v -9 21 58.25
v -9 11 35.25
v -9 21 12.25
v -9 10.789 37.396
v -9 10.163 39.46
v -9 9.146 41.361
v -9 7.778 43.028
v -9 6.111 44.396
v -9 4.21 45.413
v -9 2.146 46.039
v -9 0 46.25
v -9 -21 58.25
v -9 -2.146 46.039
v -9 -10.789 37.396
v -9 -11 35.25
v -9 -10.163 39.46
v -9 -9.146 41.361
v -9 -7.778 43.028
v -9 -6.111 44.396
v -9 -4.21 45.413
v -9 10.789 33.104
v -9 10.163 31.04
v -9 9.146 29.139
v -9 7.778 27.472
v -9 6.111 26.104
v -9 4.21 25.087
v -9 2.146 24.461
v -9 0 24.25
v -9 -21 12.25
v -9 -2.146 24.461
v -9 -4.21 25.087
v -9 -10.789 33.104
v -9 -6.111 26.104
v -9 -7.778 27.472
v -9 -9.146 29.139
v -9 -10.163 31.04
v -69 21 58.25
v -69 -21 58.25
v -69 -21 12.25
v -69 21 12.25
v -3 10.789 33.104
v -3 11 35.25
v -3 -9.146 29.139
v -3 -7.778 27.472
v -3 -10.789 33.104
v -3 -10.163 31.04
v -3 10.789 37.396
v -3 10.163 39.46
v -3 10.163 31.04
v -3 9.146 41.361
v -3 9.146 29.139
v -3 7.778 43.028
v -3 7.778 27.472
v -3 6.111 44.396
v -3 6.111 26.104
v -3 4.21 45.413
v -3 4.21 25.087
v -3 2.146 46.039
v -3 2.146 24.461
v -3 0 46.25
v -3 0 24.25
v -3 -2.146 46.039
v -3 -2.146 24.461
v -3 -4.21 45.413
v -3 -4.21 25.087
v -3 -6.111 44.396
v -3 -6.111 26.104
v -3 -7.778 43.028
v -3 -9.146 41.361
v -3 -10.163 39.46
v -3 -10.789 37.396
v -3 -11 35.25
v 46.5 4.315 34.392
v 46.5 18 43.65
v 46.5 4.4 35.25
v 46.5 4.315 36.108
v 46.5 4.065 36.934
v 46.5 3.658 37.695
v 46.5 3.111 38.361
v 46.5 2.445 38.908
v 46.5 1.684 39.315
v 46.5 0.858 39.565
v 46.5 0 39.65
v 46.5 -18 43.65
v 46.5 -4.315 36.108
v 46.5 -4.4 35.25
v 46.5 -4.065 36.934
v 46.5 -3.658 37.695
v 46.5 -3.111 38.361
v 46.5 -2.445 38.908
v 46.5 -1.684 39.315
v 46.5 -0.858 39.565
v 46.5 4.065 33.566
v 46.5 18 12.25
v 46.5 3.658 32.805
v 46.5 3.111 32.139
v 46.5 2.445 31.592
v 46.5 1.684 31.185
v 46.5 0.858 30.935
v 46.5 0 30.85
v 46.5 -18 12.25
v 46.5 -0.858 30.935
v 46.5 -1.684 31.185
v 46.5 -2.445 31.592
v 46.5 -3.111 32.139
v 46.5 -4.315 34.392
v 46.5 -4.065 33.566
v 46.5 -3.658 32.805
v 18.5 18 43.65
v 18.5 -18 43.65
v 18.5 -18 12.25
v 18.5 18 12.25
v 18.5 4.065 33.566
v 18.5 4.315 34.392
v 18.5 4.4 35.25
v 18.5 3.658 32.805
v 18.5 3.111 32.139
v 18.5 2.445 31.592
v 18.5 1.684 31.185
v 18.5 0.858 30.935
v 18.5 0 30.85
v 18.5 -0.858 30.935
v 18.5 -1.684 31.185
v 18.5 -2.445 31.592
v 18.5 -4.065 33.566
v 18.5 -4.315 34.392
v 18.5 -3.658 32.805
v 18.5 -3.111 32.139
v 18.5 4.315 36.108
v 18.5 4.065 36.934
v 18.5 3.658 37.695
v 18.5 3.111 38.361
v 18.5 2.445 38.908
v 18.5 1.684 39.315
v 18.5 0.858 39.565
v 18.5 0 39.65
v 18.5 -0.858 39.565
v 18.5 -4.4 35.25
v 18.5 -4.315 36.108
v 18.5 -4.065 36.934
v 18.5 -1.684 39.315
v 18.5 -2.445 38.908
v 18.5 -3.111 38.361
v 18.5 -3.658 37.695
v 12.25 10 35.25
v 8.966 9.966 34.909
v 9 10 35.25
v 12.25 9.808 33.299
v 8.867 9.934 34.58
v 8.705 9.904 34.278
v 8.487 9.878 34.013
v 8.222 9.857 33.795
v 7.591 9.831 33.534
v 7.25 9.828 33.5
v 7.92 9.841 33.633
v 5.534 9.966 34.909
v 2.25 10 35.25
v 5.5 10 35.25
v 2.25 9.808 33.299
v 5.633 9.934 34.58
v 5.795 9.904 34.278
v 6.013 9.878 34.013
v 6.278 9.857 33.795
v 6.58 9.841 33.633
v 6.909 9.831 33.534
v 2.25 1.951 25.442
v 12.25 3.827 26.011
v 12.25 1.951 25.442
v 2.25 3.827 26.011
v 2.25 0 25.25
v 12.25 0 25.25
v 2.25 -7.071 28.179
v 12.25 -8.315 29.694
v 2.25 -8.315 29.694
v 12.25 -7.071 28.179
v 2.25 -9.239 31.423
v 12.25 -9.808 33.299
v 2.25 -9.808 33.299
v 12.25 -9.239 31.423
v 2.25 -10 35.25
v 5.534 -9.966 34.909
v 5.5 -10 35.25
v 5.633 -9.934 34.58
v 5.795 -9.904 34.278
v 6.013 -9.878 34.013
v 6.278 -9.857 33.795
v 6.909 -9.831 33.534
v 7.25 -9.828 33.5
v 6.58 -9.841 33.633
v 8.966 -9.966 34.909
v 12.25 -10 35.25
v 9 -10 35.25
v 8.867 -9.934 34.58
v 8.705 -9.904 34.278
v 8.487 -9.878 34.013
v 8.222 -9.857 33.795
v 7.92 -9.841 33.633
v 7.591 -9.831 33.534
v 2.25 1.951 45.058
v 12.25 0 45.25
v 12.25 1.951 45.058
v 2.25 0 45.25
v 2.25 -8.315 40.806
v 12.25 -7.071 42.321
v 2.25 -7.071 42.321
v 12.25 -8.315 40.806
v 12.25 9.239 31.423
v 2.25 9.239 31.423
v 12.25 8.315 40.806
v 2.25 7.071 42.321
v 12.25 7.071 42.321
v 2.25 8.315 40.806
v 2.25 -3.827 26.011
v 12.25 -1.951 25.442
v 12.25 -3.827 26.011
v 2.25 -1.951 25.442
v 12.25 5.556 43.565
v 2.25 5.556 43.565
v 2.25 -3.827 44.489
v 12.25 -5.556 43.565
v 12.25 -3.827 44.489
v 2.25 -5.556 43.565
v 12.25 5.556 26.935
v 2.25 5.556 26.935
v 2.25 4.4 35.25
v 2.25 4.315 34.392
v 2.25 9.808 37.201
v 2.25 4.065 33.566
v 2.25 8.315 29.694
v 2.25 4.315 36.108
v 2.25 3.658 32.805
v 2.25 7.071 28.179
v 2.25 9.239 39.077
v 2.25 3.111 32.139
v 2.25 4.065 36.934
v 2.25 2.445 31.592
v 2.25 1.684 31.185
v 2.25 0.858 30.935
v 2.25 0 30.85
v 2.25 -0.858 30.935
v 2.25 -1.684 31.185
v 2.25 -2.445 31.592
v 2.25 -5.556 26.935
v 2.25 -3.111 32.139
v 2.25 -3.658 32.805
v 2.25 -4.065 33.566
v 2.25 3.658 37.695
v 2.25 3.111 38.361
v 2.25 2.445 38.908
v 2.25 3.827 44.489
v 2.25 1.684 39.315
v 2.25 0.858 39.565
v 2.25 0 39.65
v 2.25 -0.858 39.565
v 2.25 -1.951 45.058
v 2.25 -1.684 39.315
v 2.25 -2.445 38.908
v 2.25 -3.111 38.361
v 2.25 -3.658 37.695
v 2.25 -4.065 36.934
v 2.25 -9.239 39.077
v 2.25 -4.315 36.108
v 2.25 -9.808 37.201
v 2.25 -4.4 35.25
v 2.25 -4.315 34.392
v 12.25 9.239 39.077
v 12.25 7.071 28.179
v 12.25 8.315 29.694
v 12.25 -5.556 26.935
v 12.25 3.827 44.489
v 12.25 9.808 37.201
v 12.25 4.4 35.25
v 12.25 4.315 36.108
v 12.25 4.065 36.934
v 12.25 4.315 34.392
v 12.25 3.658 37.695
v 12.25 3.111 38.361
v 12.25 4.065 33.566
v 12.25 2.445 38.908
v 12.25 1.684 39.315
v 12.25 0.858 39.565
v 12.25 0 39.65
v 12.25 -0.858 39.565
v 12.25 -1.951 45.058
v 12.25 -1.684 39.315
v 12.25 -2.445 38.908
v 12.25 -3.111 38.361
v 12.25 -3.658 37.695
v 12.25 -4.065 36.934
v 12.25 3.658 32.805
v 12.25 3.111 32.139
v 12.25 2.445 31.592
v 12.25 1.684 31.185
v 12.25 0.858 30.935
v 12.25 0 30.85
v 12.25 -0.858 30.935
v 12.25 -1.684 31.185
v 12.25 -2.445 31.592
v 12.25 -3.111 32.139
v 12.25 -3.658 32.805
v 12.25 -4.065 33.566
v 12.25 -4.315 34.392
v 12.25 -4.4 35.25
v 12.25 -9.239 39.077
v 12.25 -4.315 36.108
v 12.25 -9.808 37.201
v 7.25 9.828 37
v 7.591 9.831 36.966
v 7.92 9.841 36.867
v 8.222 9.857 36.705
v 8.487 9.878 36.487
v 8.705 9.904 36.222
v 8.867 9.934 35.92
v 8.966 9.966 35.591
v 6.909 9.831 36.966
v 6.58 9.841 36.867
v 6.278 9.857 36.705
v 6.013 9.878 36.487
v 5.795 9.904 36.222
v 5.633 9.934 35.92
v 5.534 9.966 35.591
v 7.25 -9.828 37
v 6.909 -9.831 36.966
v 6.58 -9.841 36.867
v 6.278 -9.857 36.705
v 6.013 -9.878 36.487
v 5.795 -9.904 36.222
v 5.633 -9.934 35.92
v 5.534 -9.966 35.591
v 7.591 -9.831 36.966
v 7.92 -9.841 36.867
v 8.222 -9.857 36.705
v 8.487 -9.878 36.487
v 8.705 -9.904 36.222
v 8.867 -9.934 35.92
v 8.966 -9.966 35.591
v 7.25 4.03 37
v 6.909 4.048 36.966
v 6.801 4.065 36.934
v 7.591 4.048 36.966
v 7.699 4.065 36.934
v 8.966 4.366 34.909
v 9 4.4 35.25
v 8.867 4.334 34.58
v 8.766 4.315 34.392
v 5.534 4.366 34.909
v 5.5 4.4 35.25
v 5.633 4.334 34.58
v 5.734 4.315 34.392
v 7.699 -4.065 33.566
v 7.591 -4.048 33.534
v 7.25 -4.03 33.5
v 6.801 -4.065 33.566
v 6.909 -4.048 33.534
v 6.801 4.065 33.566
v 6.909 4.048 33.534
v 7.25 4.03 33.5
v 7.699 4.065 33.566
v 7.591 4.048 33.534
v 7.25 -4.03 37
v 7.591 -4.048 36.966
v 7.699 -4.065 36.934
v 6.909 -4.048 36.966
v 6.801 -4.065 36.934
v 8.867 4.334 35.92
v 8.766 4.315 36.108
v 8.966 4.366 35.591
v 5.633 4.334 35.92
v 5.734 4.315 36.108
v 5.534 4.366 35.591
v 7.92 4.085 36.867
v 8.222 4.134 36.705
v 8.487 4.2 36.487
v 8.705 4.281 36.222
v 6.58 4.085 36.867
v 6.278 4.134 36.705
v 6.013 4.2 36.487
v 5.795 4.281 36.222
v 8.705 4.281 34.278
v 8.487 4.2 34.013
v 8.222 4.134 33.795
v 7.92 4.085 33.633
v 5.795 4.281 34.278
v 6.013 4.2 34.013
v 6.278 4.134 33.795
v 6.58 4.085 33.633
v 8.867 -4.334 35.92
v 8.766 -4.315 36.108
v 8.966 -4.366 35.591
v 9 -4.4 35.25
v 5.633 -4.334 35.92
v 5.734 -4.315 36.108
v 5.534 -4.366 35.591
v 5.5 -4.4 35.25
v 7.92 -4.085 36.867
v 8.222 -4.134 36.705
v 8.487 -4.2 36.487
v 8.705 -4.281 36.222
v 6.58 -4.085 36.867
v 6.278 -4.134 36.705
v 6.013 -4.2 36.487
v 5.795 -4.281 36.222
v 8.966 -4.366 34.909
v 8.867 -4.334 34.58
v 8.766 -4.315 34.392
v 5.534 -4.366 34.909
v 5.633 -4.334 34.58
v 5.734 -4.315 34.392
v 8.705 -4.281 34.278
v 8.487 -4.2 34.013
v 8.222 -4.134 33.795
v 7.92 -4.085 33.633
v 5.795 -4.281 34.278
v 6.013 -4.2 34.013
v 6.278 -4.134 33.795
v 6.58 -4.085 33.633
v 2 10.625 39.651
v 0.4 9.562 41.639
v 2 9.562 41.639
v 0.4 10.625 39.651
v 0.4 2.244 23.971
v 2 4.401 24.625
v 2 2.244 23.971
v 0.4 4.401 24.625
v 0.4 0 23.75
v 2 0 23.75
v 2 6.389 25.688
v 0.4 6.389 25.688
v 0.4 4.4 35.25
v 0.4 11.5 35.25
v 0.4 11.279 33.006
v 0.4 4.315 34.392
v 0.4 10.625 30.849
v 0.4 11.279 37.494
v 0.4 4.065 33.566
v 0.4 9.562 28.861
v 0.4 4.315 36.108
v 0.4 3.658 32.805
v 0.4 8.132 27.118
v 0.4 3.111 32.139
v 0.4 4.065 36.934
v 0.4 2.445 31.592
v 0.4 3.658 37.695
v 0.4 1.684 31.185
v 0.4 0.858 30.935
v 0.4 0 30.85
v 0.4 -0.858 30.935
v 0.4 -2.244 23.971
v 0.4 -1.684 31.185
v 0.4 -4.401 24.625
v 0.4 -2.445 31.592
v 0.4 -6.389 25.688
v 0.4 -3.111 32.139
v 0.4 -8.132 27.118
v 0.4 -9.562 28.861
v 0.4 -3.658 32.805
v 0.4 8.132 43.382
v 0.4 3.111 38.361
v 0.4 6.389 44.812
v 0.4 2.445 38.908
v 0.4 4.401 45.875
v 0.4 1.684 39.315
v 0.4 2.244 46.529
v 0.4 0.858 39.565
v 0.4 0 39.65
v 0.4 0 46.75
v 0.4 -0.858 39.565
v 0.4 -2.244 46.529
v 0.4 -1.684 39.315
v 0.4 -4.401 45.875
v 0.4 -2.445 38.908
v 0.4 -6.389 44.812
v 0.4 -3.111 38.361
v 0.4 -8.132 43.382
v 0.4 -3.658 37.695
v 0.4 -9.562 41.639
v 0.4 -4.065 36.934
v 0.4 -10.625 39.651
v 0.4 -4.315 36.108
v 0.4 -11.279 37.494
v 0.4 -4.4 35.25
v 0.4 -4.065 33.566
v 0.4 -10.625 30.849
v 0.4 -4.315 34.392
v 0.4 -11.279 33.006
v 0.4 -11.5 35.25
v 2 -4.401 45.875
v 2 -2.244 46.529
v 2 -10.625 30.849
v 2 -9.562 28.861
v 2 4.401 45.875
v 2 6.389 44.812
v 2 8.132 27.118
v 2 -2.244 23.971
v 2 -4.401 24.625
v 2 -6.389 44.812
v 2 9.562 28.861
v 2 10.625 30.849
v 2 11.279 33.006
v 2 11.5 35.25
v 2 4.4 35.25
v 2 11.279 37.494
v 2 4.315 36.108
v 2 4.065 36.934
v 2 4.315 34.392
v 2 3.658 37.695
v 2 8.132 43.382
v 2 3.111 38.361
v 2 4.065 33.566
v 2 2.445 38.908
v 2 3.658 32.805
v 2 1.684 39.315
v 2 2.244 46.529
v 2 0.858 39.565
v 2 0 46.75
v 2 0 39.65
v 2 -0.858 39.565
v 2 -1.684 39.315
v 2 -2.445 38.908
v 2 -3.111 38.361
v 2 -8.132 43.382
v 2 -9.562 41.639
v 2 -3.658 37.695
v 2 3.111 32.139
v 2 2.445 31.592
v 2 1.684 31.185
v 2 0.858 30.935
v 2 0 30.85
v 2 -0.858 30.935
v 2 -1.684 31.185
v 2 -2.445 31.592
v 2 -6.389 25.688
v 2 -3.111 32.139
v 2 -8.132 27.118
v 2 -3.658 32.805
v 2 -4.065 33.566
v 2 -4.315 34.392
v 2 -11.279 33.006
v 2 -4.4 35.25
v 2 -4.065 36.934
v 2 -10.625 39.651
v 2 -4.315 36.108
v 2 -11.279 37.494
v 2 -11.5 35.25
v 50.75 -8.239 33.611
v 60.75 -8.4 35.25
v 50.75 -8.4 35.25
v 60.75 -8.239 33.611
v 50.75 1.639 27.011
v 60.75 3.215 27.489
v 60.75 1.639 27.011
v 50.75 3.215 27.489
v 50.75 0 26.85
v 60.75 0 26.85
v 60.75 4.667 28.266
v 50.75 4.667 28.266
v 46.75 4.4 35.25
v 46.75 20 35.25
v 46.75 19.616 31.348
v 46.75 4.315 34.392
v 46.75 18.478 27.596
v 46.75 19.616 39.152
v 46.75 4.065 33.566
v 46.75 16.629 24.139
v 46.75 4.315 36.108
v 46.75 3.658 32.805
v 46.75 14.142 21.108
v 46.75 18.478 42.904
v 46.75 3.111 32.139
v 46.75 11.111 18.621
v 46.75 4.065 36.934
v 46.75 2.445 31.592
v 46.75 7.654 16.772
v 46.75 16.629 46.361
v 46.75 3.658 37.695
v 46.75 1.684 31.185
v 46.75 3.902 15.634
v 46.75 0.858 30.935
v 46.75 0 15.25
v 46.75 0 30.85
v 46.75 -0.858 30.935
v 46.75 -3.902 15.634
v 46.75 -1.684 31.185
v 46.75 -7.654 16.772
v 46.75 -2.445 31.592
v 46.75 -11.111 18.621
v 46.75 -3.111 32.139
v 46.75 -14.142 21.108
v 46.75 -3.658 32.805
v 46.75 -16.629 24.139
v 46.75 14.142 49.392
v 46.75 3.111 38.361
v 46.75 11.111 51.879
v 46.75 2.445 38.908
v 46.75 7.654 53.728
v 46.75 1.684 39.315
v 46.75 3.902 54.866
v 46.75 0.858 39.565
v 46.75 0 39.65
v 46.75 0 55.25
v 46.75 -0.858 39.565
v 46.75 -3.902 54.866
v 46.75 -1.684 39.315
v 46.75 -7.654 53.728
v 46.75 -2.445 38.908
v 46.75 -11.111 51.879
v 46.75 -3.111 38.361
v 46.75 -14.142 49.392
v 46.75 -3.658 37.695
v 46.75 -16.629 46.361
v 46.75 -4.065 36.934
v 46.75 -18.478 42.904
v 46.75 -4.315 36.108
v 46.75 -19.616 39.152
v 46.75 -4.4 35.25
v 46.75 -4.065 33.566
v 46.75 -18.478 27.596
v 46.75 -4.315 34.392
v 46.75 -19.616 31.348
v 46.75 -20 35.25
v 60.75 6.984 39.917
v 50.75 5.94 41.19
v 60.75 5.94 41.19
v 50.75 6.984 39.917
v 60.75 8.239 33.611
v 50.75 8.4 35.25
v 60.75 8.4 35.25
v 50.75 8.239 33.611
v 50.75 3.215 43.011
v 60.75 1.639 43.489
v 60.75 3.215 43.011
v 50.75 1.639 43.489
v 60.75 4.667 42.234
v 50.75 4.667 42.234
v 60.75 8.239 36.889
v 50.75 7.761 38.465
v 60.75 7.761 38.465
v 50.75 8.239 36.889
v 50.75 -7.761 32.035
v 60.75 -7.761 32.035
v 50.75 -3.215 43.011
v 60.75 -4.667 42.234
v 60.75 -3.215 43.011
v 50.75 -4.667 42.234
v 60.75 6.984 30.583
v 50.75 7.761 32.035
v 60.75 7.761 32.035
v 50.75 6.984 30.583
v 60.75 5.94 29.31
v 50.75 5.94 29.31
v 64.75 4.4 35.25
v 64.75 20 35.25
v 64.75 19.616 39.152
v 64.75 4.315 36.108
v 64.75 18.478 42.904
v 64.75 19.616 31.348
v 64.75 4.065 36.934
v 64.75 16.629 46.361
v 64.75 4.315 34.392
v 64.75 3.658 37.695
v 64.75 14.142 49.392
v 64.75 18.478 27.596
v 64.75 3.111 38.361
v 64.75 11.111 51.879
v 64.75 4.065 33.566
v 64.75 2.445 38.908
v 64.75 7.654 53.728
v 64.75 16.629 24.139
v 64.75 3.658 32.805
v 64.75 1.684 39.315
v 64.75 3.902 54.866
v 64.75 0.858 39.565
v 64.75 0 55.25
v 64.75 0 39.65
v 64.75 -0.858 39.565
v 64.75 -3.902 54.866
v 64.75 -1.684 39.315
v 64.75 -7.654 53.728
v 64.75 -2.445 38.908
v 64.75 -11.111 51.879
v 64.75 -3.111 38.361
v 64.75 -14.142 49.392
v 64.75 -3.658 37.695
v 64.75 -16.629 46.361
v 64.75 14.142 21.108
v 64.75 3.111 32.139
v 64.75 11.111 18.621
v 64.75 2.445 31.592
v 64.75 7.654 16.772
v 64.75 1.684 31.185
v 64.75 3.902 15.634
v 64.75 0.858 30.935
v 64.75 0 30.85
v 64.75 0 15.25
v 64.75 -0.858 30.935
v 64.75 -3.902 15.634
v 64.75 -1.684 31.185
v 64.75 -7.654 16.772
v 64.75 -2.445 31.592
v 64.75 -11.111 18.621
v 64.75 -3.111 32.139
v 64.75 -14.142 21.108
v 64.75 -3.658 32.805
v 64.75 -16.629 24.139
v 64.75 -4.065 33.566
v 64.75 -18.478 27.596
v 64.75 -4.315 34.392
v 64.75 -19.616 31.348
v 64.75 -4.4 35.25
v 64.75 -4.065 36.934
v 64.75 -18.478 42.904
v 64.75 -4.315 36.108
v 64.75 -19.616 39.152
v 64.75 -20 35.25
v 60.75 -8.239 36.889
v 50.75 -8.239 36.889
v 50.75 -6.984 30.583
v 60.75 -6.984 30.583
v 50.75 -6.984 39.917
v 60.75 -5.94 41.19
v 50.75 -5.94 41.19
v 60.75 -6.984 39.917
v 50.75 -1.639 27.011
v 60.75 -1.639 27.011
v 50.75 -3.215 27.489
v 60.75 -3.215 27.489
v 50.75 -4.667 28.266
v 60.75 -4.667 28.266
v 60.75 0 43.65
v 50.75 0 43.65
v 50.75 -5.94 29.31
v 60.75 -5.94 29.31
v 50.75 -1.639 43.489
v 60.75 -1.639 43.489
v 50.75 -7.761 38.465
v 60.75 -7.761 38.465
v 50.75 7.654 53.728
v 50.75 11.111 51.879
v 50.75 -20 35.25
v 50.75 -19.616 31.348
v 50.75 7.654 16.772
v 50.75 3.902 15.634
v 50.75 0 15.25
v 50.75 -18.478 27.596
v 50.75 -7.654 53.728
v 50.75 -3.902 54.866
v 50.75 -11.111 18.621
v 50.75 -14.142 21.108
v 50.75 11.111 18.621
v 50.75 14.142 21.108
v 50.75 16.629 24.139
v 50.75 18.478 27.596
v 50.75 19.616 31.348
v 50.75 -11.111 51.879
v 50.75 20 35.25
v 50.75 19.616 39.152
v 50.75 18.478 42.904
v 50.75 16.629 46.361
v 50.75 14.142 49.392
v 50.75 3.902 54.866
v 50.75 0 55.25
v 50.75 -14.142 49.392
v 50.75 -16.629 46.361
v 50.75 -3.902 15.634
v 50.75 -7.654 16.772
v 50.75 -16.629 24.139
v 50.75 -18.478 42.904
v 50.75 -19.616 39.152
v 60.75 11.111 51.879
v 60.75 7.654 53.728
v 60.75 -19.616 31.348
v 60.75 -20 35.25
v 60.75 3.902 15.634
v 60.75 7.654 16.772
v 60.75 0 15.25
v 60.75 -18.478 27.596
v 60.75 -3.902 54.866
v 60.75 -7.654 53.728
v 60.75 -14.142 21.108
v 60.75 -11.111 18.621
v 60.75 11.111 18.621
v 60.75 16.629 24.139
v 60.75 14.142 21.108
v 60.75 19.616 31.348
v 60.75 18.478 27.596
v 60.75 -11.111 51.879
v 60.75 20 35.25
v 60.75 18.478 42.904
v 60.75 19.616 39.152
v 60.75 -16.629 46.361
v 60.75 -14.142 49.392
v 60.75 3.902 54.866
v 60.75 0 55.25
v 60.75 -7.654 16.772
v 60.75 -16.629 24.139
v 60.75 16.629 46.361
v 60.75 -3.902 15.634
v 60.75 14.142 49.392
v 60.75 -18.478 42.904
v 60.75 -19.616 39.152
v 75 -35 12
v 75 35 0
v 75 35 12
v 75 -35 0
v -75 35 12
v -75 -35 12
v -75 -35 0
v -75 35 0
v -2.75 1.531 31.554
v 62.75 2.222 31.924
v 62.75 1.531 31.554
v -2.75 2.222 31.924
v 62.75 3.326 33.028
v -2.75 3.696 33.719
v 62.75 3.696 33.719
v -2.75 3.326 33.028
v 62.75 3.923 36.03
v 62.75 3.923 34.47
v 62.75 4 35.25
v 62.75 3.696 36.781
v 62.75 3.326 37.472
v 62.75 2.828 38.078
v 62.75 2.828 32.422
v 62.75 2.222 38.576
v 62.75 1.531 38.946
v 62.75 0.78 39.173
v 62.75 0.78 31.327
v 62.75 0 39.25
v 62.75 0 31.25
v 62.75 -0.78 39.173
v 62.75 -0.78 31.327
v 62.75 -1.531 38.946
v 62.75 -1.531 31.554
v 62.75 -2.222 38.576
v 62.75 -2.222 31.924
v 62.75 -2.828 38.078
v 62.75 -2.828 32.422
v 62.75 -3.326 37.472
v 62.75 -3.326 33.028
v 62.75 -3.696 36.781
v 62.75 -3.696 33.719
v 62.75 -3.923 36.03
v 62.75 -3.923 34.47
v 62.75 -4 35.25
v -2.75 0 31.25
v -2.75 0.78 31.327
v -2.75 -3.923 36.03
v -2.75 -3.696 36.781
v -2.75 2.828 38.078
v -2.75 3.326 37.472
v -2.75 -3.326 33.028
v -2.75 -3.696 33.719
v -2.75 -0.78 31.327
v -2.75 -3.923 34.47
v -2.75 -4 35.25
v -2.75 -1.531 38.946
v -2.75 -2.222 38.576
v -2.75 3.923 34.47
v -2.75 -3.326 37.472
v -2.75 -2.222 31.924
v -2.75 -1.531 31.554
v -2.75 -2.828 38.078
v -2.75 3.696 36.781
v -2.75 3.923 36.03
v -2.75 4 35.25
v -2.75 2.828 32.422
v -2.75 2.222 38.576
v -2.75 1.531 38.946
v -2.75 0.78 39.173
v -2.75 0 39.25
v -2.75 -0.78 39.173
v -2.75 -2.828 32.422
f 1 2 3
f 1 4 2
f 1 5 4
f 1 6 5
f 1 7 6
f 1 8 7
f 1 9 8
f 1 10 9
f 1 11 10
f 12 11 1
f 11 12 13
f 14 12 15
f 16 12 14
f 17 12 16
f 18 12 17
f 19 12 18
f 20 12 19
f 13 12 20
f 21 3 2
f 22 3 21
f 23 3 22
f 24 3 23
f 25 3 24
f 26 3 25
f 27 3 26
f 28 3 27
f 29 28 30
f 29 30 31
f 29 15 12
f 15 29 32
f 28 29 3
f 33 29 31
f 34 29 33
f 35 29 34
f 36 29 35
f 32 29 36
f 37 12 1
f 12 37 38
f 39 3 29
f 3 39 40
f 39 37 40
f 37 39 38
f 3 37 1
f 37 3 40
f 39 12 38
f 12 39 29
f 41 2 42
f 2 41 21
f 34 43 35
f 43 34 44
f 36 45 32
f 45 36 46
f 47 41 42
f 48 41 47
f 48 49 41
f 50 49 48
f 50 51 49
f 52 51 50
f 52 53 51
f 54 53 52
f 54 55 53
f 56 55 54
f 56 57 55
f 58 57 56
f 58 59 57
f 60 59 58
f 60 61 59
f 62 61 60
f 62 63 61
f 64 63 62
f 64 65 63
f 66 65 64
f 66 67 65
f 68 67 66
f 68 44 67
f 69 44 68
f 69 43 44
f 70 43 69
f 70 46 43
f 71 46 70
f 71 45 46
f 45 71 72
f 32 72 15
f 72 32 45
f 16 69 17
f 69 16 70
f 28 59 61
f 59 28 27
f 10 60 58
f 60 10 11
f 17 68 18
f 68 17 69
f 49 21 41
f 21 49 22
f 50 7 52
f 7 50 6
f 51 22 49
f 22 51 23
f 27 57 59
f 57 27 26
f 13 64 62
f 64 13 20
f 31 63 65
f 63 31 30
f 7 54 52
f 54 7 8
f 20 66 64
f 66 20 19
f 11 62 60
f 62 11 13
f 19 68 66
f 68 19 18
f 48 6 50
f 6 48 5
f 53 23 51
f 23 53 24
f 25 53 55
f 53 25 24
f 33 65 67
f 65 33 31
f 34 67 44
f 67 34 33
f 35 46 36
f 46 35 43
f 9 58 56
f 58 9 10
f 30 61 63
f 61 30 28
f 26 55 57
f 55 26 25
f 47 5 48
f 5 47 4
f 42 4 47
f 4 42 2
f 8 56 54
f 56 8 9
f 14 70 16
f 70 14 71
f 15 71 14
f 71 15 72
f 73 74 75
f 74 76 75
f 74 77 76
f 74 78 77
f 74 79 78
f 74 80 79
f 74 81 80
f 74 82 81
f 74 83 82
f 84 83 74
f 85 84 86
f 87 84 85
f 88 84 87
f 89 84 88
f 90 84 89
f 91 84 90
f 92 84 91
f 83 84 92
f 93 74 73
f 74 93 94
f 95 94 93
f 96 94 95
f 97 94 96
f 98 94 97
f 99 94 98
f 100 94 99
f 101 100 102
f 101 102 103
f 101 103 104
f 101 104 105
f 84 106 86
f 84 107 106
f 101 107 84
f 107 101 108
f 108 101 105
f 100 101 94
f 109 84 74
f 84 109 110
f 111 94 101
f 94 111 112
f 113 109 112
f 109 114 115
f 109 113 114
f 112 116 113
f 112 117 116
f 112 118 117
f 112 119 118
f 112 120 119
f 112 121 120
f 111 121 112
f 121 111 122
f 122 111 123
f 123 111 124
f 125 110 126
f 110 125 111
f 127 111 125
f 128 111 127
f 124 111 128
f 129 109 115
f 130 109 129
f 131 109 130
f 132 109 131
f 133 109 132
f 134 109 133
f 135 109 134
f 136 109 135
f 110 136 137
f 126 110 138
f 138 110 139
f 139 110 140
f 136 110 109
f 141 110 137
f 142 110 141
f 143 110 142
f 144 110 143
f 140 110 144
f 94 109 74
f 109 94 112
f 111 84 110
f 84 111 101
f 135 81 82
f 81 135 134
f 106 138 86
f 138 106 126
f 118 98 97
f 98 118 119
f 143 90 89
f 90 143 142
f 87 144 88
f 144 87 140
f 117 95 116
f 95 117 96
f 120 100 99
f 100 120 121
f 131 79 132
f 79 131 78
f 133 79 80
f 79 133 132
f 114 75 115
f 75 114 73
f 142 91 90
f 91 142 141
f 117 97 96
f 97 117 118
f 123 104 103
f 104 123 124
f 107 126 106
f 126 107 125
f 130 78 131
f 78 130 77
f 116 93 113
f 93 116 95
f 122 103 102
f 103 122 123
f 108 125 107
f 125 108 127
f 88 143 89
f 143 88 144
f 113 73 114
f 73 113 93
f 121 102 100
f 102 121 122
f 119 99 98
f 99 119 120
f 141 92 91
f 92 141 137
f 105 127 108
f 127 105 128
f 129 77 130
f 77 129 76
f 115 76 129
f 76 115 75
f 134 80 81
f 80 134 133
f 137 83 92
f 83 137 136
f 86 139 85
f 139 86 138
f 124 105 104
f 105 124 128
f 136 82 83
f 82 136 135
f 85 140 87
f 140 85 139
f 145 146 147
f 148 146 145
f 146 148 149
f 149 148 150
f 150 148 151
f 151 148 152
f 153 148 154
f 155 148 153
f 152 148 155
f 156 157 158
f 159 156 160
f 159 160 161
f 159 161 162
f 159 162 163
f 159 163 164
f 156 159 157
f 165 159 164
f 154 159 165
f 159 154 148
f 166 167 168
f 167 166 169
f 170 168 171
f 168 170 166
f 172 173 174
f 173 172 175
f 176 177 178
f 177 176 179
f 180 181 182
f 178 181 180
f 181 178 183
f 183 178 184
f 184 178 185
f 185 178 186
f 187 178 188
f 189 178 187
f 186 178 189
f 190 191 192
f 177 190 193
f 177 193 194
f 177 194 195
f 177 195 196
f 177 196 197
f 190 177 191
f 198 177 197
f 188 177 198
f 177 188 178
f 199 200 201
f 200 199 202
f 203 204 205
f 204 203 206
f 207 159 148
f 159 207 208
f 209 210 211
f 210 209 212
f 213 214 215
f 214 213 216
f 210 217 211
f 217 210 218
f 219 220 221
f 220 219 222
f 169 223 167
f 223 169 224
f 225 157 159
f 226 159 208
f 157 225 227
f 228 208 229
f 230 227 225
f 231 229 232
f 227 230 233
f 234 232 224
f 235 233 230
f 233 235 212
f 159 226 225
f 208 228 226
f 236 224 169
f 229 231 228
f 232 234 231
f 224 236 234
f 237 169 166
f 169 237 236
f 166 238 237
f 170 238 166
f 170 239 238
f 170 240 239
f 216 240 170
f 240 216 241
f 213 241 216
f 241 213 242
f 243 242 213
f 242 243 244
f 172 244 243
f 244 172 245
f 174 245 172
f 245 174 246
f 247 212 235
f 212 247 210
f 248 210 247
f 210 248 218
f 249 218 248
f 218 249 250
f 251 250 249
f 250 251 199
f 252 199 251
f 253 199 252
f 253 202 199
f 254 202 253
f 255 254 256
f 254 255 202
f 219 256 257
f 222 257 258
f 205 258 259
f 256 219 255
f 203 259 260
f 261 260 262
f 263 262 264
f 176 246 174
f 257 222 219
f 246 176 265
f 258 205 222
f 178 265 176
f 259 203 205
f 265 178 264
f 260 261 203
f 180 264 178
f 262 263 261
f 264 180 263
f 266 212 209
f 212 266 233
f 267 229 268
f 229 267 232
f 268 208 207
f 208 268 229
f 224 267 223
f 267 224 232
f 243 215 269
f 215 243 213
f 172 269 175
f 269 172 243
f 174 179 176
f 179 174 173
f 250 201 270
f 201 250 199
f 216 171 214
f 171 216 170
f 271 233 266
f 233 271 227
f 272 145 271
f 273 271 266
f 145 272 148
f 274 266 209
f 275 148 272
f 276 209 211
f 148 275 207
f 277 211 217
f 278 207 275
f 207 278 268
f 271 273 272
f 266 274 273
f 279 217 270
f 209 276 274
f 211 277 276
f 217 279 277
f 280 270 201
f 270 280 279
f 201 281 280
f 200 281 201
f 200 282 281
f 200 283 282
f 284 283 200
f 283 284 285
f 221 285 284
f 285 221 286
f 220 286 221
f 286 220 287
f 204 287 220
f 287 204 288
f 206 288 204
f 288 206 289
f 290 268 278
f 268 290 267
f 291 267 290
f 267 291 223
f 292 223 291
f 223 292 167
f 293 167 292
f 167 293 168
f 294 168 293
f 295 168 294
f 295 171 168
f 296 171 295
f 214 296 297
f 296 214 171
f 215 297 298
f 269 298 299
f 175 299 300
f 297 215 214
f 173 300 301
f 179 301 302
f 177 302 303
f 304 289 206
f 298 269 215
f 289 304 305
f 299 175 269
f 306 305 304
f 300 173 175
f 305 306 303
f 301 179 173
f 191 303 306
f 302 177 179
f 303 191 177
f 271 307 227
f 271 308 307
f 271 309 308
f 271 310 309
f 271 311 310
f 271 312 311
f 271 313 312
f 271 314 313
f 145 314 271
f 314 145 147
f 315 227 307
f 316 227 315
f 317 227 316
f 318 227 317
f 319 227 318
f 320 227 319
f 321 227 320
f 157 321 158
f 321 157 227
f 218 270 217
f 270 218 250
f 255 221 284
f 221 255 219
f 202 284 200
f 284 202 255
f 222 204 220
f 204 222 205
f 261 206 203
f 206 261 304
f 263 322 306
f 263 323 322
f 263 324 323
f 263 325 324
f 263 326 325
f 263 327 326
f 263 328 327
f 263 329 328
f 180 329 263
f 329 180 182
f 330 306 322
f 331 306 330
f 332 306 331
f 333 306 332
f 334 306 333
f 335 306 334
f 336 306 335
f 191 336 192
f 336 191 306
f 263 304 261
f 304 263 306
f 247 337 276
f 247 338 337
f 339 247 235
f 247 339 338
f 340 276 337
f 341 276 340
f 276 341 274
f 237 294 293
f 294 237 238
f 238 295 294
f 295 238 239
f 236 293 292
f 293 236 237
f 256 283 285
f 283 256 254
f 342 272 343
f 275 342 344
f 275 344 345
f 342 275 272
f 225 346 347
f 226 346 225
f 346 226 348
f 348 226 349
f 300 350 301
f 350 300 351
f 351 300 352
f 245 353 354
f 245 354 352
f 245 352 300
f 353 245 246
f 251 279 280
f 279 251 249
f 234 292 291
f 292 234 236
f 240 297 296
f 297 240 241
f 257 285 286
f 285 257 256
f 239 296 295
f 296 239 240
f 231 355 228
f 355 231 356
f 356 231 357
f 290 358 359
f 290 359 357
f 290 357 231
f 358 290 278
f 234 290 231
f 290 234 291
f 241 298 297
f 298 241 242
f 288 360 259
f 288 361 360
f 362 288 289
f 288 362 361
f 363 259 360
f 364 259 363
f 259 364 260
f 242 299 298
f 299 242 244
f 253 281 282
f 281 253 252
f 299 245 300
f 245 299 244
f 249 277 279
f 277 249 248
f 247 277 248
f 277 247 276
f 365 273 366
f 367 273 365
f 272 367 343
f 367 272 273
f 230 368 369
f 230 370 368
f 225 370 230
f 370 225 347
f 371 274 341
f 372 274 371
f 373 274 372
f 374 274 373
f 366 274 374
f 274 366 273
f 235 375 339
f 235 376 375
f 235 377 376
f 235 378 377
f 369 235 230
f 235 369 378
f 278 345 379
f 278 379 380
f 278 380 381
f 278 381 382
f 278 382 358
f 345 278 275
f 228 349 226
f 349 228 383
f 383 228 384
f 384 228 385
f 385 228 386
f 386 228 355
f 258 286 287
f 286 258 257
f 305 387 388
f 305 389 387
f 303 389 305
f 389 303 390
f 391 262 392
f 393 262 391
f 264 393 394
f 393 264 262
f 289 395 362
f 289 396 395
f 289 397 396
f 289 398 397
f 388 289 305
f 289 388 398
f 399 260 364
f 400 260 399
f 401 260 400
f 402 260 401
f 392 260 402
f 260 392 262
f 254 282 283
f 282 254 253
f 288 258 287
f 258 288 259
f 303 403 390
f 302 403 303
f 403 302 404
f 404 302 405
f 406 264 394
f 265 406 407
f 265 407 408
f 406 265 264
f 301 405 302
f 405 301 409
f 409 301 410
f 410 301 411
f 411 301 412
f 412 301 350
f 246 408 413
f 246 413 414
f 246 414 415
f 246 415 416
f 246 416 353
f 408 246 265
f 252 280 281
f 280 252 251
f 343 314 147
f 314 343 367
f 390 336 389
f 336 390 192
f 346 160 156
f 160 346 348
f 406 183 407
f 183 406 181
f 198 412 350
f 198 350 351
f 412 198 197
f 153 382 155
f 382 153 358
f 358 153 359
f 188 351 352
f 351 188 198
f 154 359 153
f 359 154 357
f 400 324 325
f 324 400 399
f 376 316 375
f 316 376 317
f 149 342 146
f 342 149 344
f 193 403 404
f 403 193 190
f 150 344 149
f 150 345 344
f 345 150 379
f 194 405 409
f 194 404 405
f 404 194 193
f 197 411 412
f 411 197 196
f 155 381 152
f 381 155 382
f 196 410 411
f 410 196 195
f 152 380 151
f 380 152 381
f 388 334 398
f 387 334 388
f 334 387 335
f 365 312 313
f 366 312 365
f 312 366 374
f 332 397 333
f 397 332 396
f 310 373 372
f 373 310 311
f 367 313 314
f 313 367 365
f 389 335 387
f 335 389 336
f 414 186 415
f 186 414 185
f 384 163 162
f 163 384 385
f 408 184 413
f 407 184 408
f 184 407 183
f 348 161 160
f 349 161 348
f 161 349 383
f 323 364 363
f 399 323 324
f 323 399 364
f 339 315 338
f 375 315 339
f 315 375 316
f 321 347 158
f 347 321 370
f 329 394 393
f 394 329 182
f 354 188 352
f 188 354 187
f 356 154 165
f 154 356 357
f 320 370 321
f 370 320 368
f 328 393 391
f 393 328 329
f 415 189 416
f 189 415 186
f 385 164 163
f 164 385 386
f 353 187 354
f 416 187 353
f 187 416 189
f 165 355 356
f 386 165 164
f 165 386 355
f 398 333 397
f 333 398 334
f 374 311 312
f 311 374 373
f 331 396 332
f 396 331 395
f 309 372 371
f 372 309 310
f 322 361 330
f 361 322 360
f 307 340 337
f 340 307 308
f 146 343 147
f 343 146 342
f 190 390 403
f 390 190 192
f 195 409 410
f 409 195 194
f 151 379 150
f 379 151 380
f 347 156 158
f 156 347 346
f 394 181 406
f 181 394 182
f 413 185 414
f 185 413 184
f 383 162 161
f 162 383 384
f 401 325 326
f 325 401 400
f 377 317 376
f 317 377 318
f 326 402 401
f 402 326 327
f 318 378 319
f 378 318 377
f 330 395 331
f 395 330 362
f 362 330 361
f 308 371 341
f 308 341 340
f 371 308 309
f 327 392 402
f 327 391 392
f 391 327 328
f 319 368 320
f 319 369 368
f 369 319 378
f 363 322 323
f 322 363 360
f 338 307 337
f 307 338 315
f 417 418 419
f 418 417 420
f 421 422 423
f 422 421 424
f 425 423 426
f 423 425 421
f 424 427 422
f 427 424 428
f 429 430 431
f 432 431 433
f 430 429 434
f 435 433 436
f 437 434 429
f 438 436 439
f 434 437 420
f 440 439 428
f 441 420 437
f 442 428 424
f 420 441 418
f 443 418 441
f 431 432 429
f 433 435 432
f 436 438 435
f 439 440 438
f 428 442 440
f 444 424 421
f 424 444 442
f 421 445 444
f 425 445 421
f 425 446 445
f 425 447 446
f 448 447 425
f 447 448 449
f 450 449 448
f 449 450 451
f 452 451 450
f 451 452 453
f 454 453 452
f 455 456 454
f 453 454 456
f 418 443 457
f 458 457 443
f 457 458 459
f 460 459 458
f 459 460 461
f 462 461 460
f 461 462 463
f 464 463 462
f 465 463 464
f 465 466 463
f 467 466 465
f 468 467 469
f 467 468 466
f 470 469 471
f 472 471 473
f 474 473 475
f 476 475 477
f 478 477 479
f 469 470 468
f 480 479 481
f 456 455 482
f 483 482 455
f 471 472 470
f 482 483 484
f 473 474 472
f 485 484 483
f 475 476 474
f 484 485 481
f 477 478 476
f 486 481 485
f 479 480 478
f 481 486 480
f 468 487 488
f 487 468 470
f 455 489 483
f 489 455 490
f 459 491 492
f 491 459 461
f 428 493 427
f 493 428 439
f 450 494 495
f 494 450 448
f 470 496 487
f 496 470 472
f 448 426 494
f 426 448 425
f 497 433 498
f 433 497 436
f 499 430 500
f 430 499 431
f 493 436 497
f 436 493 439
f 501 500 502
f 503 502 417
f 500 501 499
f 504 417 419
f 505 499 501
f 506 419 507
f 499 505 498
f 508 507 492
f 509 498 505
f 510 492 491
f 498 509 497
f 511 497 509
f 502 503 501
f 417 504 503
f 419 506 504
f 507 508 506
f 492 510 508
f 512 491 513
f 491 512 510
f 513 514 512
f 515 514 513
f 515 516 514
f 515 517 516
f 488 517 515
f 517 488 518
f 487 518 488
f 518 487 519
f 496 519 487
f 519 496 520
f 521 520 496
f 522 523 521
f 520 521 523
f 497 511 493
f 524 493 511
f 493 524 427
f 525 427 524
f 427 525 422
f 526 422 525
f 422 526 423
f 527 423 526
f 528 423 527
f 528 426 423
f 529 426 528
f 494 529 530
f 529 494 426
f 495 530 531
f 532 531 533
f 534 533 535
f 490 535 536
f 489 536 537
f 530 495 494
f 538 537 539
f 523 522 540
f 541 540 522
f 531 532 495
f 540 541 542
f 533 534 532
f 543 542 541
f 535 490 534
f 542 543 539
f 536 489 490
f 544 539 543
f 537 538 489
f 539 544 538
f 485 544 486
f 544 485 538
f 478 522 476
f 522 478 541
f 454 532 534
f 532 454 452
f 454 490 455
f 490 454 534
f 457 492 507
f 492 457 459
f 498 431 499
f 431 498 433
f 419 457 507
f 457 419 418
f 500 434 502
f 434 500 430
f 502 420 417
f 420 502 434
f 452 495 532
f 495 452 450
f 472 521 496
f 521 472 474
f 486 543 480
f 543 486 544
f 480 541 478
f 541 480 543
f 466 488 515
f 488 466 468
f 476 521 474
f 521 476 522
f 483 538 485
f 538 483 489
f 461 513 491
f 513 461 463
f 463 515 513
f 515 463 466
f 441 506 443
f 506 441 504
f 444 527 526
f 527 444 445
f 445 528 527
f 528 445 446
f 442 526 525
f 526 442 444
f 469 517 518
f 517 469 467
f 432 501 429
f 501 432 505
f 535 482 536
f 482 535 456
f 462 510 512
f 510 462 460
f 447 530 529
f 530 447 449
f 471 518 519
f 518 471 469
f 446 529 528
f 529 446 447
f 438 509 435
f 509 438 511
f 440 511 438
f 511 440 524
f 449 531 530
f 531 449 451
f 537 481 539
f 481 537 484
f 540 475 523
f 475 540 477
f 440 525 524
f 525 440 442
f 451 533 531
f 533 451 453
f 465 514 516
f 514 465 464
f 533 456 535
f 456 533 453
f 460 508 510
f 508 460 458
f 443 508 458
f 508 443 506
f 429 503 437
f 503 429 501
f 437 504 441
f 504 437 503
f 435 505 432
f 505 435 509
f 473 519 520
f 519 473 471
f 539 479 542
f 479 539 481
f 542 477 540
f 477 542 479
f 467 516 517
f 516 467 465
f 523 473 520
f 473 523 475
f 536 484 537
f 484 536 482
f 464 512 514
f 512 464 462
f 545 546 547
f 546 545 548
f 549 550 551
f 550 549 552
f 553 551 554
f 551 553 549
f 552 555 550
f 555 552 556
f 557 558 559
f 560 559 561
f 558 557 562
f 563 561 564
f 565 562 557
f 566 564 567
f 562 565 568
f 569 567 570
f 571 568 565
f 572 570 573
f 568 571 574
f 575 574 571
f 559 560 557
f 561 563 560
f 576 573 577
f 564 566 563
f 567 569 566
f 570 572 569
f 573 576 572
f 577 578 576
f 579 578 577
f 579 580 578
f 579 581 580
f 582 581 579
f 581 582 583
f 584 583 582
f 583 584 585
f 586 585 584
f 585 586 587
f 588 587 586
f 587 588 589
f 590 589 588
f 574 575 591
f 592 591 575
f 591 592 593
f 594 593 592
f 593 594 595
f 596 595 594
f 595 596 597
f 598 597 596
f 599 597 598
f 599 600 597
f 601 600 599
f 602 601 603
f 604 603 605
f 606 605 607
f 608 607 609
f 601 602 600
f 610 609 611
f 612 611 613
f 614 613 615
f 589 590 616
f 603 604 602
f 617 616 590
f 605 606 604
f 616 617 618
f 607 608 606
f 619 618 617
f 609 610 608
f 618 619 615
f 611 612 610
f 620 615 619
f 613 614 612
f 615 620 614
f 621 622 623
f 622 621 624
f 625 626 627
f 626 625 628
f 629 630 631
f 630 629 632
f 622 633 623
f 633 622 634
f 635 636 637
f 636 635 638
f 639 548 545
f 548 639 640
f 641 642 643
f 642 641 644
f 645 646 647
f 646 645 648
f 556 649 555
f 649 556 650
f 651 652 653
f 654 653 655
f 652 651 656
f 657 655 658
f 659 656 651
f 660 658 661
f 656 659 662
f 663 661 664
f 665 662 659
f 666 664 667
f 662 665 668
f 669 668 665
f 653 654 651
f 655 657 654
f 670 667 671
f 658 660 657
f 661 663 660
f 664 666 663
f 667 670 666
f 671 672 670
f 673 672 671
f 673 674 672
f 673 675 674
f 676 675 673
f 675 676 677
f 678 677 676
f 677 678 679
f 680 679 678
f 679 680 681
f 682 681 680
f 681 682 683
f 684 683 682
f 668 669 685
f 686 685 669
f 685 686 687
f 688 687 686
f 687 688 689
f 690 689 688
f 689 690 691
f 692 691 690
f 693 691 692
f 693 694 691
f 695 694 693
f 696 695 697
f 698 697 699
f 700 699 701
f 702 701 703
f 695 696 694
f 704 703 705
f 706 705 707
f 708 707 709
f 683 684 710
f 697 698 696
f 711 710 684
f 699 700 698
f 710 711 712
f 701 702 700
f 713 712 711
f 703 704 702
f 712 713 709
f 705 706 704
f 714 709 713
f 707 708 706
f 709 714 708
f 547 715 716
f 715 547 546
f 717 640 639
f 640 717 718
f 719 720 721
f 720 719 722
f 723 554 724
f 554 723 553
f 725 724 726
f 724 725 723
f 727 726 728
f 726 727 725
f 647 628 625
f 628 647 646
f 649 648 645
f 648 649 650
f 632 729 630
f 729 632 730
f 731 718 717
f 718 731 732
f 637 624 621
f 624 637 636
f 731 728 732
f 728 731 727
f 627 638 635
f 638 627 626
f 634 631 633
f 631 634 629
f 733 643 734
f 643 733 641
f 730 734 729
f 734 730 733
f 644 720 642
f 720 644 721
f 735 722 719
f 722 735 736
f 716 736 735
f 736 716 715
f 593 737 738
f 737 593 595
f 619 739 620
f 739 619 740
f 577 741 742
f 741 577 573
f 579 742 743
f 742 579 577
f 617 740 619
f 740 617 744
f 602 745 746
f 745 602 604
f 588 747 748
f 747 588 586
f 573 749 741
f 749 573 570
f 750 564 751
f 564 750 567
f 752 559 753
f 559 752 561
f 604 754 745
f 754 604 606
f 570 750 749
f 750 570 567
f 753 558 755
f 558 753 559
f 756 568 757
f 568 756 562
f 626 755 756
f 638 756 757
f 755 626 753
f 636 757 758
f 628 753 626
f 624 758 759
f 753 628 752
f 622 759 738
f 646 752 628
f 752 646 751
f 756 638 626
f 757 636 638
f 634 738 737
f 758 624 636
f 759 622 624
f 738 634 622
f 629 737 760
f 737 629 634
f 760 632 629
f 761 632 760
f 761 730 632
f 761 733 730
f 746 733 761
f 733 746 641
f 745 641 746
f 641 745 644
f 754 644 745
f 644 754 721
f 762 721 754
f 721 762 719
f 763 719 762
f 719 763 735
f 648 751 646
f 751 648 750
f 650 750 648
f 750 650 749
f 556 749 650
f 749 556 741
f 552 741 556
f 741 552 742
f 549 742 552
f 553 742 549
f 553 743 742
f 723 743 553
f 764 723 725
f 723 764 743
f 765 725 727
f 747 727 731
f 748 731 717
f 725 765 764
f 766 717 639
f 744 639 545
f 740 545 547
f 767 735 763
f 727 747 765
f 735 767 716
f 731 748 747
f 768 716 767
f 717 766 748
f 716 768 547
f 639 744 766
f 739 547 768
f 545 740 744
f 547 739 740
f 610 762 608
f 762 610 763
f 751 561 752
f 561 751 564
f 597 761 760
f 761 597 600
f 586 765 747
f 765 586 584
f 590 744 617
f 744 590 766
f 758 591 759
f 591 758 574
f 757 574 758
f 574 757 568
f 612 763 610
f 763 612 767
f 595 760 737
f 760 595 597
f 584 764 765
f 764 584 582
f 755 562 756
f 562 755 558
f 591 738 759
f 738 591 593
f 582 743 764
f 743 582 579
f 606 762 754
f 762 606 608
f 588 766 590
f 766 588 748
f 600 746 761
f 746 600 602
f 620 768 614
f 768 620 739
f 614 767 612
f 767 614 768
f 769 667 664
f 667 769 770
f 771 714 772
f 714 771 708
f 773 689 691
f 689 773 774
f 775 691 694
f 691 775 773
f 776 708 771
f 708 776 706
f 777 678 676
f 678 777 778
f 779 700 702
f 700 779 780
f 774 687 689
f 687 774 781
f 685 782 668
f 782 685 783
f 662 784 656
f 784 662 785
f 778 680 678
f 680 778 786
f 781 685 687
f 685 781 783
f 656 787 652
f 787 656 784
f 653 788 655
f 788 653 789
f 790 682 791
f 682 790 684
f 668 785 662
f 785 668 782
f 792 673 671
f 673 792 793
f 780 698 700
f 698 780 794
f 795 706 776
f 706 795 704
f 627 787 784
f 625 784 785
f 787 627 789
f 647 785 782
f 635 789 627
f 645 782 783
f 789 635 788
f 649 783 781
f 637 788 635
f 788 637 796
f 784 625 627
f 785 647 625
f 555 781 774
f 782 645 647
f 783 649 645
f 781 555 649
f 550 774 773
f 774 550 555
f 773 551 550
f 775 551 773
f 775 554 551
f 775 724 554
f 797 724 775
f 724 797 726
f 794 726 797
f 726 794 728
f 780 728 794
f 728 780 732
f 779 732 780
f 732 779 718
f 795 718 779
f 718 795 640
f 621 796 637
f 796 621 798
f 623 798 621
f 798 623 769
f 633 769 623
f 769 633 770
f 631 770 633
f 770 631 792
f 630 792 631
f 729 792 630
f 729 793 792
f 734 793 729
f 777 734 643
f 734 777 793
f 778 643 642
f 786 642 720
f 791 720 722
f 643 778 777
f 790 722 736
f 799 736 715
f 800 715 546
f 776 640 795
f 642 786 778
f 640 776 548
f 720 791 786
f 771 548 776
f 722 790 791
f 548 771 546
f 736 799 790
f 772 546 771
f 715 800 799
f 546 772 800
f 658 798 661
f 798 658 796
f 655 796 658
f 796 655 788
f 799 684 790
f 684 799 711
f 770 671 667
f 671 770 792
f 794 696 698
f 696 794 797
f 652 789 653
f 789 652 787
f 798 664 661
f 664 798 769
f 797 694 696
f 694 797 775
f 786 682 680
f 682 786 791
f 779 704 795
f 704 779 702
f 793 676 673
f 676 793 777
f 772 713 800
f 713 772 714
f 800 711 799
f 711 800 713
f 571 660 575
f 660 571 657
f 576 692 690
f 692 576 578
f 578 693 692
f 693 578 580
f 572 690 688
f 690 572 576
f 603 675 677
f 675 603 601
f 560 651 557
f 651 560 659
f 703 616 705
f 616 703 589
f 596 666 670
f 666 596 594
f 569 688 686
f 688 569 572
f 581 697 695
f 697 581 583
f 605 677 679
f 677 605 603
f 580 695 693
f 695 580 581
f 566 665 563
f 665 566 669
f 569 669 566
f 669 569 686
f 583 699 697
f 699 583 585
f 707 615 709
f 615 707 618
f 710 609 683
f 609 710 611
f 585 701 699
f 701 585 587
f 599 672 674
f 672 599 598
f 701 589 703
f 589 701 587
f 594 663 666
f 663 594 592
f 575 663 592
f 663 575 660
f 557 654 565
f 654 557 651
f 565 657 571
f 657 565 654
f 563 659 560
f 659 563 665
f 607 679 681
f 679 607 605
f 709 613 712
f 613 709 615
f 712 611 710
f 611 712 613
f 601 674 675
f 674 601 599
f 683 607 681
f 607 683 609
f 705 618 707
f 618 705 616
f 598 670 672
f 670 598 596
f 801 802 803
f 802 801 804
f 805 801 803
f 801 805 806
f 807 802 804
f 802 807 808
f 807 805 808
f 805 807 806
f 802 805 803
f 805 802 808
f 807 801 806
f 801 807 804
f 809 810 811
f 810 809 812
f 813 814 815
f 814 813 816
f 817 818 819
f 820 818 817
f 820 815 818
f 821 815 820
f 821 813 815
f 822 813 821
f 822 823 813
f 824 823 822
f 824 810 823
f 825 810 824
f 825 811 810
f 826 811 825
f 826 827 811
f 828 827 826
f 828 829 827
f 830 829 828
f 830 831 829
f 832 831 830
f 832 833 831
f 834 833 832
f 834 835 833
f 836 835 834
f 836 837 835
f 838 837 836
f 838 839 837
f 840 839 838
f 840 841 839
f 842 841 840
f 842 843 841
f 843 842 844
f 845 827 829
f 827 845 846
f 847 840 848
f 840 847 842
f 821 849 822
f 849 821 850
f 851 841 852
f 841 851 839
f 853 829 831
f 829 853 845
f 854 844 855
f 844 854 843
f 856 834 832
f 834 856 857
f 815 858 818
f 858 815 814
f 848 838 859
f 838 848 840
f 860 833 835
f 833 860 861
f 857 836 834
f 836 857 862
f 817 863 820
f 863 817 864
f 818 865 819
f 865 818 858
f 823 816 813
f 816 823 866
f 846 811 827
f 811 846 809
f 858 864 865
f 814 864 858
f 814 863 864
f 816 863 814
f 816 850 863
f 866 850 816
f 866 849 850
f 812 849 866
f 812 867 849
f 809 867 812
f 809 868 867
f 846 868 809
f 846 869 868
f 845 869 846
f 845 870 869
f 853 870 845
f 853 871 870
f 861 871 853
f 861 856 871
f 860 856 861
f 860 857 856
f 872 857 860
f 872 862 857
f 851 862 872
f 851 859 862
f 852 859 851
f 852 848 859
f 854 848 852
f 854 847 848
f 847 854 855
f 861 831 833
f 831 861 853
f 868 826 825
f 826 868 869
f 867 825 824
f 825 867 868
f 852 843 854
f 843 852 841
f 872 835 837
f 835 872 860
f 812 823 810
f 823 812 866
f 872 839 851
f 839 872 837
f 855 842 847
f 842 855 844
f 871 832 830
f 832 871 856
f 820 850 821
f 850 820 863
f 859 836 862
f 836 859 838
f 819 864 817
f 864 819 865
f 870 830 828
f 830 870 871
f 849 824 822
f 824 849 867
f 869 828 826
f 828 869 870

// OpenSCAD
$fn = 32;

// ------------------------------------------------------------------------
// Motor drive station: motor 60 x 46 mm, shaft d8, pulley d40
// Every part is its own module, assembly() places every instance.
// ------------------------------------------------------------------------

// --- part 1 ---
module station_bed() {
  difference() {
    translate([-75, -35, 0]) cube([150, 70, 12]);
  }
}

// --- part 2 ---
module drive_motor() {
  union() {
    translate([-30, -21, 0]) cube([60, 42, 46]);
    translate([33, 0, 23]) rotate([0, 90, 0]) cylinder(h = 6, d = 22, center = true);
  }
}

// --- part 3 ---
module pillow_block() {
  difference() {
    translate([-14, -18, 0]) cube([28, 36, 31.4]);
    translate([0, 0, 23]) rotate([0, 90, 0]) cylinder(h = 30, d = 8.8, center = true);
  }
}

// --- part 4 ---
module drive_shaft() {
  translate([0, 0, -32.75]) cylinder(h = 65.5, d = 8);
}

// --- part 5 ---
module shaft_collar() {
  difference() {
    cylinder(h = 10, d = 20);
    translate([0, 0, -1]) cylinder(h = 12, d = 8.8);
    translate([0, 0, 5]) rotate([90, 0, 0]) cylinder(h = 22, d = 3.5, center = true);
  }
}

// --- part 6 ---
module collar_washer() {
  difference() {
      translate([0, 0, 0]) cylinder(h = 1.6, d = 23);
      translate([0, 0, -1]) cylinder(h = 3.6, d = 8.8);
    }
}

// --- part 7 ---
module drive_pulley() {
  difference() {
    union() {
      cylinder(h = 18, d = 16.8);
      cylinder(h = 4, d = 40);
      translate([0, 0, 14]) cylinder(h = 4, d = 40);
    }
    translate([0, 0, -1]) cylinder(h = 20, d = 8.8);
  }
}

// --- assembly ---
module assembly() {
  color([0.80, 0.24, 0.20]) translate([0, 0, 0]) rotate([0, 0, 0]) station_bed();
  color([0.20, 0.45, 0.75]) translate([-39, 0, 12.25]) rotate([0, 0, 0]) drive_motor();
  color([0.25, 0.62, 0.32]) translate([32.5, 0, 12.25]) rotate([0, 0, 0]) pillow_block();
  color([0.92, 0.70, 0.18]) translate([30, 0, 35.25]) rotate([0, 90, 0]) drive_shaft();
  color([0.58, 0.35, 0.70]) translate([2.25, 0, 35.25]) rotate([0, 90, 0]) shaft_collar();
  color([0.16, 0.66, 0.66]) translate([0.4, 0, 35.25]) rotate([0, 90, 0]) collar_washer();
  color([0.85, 0.48, 0.18]) translate([46.75, 0, 35.25]) rotate([0, 90, 0]) drive_pulley();
}

assembly();
